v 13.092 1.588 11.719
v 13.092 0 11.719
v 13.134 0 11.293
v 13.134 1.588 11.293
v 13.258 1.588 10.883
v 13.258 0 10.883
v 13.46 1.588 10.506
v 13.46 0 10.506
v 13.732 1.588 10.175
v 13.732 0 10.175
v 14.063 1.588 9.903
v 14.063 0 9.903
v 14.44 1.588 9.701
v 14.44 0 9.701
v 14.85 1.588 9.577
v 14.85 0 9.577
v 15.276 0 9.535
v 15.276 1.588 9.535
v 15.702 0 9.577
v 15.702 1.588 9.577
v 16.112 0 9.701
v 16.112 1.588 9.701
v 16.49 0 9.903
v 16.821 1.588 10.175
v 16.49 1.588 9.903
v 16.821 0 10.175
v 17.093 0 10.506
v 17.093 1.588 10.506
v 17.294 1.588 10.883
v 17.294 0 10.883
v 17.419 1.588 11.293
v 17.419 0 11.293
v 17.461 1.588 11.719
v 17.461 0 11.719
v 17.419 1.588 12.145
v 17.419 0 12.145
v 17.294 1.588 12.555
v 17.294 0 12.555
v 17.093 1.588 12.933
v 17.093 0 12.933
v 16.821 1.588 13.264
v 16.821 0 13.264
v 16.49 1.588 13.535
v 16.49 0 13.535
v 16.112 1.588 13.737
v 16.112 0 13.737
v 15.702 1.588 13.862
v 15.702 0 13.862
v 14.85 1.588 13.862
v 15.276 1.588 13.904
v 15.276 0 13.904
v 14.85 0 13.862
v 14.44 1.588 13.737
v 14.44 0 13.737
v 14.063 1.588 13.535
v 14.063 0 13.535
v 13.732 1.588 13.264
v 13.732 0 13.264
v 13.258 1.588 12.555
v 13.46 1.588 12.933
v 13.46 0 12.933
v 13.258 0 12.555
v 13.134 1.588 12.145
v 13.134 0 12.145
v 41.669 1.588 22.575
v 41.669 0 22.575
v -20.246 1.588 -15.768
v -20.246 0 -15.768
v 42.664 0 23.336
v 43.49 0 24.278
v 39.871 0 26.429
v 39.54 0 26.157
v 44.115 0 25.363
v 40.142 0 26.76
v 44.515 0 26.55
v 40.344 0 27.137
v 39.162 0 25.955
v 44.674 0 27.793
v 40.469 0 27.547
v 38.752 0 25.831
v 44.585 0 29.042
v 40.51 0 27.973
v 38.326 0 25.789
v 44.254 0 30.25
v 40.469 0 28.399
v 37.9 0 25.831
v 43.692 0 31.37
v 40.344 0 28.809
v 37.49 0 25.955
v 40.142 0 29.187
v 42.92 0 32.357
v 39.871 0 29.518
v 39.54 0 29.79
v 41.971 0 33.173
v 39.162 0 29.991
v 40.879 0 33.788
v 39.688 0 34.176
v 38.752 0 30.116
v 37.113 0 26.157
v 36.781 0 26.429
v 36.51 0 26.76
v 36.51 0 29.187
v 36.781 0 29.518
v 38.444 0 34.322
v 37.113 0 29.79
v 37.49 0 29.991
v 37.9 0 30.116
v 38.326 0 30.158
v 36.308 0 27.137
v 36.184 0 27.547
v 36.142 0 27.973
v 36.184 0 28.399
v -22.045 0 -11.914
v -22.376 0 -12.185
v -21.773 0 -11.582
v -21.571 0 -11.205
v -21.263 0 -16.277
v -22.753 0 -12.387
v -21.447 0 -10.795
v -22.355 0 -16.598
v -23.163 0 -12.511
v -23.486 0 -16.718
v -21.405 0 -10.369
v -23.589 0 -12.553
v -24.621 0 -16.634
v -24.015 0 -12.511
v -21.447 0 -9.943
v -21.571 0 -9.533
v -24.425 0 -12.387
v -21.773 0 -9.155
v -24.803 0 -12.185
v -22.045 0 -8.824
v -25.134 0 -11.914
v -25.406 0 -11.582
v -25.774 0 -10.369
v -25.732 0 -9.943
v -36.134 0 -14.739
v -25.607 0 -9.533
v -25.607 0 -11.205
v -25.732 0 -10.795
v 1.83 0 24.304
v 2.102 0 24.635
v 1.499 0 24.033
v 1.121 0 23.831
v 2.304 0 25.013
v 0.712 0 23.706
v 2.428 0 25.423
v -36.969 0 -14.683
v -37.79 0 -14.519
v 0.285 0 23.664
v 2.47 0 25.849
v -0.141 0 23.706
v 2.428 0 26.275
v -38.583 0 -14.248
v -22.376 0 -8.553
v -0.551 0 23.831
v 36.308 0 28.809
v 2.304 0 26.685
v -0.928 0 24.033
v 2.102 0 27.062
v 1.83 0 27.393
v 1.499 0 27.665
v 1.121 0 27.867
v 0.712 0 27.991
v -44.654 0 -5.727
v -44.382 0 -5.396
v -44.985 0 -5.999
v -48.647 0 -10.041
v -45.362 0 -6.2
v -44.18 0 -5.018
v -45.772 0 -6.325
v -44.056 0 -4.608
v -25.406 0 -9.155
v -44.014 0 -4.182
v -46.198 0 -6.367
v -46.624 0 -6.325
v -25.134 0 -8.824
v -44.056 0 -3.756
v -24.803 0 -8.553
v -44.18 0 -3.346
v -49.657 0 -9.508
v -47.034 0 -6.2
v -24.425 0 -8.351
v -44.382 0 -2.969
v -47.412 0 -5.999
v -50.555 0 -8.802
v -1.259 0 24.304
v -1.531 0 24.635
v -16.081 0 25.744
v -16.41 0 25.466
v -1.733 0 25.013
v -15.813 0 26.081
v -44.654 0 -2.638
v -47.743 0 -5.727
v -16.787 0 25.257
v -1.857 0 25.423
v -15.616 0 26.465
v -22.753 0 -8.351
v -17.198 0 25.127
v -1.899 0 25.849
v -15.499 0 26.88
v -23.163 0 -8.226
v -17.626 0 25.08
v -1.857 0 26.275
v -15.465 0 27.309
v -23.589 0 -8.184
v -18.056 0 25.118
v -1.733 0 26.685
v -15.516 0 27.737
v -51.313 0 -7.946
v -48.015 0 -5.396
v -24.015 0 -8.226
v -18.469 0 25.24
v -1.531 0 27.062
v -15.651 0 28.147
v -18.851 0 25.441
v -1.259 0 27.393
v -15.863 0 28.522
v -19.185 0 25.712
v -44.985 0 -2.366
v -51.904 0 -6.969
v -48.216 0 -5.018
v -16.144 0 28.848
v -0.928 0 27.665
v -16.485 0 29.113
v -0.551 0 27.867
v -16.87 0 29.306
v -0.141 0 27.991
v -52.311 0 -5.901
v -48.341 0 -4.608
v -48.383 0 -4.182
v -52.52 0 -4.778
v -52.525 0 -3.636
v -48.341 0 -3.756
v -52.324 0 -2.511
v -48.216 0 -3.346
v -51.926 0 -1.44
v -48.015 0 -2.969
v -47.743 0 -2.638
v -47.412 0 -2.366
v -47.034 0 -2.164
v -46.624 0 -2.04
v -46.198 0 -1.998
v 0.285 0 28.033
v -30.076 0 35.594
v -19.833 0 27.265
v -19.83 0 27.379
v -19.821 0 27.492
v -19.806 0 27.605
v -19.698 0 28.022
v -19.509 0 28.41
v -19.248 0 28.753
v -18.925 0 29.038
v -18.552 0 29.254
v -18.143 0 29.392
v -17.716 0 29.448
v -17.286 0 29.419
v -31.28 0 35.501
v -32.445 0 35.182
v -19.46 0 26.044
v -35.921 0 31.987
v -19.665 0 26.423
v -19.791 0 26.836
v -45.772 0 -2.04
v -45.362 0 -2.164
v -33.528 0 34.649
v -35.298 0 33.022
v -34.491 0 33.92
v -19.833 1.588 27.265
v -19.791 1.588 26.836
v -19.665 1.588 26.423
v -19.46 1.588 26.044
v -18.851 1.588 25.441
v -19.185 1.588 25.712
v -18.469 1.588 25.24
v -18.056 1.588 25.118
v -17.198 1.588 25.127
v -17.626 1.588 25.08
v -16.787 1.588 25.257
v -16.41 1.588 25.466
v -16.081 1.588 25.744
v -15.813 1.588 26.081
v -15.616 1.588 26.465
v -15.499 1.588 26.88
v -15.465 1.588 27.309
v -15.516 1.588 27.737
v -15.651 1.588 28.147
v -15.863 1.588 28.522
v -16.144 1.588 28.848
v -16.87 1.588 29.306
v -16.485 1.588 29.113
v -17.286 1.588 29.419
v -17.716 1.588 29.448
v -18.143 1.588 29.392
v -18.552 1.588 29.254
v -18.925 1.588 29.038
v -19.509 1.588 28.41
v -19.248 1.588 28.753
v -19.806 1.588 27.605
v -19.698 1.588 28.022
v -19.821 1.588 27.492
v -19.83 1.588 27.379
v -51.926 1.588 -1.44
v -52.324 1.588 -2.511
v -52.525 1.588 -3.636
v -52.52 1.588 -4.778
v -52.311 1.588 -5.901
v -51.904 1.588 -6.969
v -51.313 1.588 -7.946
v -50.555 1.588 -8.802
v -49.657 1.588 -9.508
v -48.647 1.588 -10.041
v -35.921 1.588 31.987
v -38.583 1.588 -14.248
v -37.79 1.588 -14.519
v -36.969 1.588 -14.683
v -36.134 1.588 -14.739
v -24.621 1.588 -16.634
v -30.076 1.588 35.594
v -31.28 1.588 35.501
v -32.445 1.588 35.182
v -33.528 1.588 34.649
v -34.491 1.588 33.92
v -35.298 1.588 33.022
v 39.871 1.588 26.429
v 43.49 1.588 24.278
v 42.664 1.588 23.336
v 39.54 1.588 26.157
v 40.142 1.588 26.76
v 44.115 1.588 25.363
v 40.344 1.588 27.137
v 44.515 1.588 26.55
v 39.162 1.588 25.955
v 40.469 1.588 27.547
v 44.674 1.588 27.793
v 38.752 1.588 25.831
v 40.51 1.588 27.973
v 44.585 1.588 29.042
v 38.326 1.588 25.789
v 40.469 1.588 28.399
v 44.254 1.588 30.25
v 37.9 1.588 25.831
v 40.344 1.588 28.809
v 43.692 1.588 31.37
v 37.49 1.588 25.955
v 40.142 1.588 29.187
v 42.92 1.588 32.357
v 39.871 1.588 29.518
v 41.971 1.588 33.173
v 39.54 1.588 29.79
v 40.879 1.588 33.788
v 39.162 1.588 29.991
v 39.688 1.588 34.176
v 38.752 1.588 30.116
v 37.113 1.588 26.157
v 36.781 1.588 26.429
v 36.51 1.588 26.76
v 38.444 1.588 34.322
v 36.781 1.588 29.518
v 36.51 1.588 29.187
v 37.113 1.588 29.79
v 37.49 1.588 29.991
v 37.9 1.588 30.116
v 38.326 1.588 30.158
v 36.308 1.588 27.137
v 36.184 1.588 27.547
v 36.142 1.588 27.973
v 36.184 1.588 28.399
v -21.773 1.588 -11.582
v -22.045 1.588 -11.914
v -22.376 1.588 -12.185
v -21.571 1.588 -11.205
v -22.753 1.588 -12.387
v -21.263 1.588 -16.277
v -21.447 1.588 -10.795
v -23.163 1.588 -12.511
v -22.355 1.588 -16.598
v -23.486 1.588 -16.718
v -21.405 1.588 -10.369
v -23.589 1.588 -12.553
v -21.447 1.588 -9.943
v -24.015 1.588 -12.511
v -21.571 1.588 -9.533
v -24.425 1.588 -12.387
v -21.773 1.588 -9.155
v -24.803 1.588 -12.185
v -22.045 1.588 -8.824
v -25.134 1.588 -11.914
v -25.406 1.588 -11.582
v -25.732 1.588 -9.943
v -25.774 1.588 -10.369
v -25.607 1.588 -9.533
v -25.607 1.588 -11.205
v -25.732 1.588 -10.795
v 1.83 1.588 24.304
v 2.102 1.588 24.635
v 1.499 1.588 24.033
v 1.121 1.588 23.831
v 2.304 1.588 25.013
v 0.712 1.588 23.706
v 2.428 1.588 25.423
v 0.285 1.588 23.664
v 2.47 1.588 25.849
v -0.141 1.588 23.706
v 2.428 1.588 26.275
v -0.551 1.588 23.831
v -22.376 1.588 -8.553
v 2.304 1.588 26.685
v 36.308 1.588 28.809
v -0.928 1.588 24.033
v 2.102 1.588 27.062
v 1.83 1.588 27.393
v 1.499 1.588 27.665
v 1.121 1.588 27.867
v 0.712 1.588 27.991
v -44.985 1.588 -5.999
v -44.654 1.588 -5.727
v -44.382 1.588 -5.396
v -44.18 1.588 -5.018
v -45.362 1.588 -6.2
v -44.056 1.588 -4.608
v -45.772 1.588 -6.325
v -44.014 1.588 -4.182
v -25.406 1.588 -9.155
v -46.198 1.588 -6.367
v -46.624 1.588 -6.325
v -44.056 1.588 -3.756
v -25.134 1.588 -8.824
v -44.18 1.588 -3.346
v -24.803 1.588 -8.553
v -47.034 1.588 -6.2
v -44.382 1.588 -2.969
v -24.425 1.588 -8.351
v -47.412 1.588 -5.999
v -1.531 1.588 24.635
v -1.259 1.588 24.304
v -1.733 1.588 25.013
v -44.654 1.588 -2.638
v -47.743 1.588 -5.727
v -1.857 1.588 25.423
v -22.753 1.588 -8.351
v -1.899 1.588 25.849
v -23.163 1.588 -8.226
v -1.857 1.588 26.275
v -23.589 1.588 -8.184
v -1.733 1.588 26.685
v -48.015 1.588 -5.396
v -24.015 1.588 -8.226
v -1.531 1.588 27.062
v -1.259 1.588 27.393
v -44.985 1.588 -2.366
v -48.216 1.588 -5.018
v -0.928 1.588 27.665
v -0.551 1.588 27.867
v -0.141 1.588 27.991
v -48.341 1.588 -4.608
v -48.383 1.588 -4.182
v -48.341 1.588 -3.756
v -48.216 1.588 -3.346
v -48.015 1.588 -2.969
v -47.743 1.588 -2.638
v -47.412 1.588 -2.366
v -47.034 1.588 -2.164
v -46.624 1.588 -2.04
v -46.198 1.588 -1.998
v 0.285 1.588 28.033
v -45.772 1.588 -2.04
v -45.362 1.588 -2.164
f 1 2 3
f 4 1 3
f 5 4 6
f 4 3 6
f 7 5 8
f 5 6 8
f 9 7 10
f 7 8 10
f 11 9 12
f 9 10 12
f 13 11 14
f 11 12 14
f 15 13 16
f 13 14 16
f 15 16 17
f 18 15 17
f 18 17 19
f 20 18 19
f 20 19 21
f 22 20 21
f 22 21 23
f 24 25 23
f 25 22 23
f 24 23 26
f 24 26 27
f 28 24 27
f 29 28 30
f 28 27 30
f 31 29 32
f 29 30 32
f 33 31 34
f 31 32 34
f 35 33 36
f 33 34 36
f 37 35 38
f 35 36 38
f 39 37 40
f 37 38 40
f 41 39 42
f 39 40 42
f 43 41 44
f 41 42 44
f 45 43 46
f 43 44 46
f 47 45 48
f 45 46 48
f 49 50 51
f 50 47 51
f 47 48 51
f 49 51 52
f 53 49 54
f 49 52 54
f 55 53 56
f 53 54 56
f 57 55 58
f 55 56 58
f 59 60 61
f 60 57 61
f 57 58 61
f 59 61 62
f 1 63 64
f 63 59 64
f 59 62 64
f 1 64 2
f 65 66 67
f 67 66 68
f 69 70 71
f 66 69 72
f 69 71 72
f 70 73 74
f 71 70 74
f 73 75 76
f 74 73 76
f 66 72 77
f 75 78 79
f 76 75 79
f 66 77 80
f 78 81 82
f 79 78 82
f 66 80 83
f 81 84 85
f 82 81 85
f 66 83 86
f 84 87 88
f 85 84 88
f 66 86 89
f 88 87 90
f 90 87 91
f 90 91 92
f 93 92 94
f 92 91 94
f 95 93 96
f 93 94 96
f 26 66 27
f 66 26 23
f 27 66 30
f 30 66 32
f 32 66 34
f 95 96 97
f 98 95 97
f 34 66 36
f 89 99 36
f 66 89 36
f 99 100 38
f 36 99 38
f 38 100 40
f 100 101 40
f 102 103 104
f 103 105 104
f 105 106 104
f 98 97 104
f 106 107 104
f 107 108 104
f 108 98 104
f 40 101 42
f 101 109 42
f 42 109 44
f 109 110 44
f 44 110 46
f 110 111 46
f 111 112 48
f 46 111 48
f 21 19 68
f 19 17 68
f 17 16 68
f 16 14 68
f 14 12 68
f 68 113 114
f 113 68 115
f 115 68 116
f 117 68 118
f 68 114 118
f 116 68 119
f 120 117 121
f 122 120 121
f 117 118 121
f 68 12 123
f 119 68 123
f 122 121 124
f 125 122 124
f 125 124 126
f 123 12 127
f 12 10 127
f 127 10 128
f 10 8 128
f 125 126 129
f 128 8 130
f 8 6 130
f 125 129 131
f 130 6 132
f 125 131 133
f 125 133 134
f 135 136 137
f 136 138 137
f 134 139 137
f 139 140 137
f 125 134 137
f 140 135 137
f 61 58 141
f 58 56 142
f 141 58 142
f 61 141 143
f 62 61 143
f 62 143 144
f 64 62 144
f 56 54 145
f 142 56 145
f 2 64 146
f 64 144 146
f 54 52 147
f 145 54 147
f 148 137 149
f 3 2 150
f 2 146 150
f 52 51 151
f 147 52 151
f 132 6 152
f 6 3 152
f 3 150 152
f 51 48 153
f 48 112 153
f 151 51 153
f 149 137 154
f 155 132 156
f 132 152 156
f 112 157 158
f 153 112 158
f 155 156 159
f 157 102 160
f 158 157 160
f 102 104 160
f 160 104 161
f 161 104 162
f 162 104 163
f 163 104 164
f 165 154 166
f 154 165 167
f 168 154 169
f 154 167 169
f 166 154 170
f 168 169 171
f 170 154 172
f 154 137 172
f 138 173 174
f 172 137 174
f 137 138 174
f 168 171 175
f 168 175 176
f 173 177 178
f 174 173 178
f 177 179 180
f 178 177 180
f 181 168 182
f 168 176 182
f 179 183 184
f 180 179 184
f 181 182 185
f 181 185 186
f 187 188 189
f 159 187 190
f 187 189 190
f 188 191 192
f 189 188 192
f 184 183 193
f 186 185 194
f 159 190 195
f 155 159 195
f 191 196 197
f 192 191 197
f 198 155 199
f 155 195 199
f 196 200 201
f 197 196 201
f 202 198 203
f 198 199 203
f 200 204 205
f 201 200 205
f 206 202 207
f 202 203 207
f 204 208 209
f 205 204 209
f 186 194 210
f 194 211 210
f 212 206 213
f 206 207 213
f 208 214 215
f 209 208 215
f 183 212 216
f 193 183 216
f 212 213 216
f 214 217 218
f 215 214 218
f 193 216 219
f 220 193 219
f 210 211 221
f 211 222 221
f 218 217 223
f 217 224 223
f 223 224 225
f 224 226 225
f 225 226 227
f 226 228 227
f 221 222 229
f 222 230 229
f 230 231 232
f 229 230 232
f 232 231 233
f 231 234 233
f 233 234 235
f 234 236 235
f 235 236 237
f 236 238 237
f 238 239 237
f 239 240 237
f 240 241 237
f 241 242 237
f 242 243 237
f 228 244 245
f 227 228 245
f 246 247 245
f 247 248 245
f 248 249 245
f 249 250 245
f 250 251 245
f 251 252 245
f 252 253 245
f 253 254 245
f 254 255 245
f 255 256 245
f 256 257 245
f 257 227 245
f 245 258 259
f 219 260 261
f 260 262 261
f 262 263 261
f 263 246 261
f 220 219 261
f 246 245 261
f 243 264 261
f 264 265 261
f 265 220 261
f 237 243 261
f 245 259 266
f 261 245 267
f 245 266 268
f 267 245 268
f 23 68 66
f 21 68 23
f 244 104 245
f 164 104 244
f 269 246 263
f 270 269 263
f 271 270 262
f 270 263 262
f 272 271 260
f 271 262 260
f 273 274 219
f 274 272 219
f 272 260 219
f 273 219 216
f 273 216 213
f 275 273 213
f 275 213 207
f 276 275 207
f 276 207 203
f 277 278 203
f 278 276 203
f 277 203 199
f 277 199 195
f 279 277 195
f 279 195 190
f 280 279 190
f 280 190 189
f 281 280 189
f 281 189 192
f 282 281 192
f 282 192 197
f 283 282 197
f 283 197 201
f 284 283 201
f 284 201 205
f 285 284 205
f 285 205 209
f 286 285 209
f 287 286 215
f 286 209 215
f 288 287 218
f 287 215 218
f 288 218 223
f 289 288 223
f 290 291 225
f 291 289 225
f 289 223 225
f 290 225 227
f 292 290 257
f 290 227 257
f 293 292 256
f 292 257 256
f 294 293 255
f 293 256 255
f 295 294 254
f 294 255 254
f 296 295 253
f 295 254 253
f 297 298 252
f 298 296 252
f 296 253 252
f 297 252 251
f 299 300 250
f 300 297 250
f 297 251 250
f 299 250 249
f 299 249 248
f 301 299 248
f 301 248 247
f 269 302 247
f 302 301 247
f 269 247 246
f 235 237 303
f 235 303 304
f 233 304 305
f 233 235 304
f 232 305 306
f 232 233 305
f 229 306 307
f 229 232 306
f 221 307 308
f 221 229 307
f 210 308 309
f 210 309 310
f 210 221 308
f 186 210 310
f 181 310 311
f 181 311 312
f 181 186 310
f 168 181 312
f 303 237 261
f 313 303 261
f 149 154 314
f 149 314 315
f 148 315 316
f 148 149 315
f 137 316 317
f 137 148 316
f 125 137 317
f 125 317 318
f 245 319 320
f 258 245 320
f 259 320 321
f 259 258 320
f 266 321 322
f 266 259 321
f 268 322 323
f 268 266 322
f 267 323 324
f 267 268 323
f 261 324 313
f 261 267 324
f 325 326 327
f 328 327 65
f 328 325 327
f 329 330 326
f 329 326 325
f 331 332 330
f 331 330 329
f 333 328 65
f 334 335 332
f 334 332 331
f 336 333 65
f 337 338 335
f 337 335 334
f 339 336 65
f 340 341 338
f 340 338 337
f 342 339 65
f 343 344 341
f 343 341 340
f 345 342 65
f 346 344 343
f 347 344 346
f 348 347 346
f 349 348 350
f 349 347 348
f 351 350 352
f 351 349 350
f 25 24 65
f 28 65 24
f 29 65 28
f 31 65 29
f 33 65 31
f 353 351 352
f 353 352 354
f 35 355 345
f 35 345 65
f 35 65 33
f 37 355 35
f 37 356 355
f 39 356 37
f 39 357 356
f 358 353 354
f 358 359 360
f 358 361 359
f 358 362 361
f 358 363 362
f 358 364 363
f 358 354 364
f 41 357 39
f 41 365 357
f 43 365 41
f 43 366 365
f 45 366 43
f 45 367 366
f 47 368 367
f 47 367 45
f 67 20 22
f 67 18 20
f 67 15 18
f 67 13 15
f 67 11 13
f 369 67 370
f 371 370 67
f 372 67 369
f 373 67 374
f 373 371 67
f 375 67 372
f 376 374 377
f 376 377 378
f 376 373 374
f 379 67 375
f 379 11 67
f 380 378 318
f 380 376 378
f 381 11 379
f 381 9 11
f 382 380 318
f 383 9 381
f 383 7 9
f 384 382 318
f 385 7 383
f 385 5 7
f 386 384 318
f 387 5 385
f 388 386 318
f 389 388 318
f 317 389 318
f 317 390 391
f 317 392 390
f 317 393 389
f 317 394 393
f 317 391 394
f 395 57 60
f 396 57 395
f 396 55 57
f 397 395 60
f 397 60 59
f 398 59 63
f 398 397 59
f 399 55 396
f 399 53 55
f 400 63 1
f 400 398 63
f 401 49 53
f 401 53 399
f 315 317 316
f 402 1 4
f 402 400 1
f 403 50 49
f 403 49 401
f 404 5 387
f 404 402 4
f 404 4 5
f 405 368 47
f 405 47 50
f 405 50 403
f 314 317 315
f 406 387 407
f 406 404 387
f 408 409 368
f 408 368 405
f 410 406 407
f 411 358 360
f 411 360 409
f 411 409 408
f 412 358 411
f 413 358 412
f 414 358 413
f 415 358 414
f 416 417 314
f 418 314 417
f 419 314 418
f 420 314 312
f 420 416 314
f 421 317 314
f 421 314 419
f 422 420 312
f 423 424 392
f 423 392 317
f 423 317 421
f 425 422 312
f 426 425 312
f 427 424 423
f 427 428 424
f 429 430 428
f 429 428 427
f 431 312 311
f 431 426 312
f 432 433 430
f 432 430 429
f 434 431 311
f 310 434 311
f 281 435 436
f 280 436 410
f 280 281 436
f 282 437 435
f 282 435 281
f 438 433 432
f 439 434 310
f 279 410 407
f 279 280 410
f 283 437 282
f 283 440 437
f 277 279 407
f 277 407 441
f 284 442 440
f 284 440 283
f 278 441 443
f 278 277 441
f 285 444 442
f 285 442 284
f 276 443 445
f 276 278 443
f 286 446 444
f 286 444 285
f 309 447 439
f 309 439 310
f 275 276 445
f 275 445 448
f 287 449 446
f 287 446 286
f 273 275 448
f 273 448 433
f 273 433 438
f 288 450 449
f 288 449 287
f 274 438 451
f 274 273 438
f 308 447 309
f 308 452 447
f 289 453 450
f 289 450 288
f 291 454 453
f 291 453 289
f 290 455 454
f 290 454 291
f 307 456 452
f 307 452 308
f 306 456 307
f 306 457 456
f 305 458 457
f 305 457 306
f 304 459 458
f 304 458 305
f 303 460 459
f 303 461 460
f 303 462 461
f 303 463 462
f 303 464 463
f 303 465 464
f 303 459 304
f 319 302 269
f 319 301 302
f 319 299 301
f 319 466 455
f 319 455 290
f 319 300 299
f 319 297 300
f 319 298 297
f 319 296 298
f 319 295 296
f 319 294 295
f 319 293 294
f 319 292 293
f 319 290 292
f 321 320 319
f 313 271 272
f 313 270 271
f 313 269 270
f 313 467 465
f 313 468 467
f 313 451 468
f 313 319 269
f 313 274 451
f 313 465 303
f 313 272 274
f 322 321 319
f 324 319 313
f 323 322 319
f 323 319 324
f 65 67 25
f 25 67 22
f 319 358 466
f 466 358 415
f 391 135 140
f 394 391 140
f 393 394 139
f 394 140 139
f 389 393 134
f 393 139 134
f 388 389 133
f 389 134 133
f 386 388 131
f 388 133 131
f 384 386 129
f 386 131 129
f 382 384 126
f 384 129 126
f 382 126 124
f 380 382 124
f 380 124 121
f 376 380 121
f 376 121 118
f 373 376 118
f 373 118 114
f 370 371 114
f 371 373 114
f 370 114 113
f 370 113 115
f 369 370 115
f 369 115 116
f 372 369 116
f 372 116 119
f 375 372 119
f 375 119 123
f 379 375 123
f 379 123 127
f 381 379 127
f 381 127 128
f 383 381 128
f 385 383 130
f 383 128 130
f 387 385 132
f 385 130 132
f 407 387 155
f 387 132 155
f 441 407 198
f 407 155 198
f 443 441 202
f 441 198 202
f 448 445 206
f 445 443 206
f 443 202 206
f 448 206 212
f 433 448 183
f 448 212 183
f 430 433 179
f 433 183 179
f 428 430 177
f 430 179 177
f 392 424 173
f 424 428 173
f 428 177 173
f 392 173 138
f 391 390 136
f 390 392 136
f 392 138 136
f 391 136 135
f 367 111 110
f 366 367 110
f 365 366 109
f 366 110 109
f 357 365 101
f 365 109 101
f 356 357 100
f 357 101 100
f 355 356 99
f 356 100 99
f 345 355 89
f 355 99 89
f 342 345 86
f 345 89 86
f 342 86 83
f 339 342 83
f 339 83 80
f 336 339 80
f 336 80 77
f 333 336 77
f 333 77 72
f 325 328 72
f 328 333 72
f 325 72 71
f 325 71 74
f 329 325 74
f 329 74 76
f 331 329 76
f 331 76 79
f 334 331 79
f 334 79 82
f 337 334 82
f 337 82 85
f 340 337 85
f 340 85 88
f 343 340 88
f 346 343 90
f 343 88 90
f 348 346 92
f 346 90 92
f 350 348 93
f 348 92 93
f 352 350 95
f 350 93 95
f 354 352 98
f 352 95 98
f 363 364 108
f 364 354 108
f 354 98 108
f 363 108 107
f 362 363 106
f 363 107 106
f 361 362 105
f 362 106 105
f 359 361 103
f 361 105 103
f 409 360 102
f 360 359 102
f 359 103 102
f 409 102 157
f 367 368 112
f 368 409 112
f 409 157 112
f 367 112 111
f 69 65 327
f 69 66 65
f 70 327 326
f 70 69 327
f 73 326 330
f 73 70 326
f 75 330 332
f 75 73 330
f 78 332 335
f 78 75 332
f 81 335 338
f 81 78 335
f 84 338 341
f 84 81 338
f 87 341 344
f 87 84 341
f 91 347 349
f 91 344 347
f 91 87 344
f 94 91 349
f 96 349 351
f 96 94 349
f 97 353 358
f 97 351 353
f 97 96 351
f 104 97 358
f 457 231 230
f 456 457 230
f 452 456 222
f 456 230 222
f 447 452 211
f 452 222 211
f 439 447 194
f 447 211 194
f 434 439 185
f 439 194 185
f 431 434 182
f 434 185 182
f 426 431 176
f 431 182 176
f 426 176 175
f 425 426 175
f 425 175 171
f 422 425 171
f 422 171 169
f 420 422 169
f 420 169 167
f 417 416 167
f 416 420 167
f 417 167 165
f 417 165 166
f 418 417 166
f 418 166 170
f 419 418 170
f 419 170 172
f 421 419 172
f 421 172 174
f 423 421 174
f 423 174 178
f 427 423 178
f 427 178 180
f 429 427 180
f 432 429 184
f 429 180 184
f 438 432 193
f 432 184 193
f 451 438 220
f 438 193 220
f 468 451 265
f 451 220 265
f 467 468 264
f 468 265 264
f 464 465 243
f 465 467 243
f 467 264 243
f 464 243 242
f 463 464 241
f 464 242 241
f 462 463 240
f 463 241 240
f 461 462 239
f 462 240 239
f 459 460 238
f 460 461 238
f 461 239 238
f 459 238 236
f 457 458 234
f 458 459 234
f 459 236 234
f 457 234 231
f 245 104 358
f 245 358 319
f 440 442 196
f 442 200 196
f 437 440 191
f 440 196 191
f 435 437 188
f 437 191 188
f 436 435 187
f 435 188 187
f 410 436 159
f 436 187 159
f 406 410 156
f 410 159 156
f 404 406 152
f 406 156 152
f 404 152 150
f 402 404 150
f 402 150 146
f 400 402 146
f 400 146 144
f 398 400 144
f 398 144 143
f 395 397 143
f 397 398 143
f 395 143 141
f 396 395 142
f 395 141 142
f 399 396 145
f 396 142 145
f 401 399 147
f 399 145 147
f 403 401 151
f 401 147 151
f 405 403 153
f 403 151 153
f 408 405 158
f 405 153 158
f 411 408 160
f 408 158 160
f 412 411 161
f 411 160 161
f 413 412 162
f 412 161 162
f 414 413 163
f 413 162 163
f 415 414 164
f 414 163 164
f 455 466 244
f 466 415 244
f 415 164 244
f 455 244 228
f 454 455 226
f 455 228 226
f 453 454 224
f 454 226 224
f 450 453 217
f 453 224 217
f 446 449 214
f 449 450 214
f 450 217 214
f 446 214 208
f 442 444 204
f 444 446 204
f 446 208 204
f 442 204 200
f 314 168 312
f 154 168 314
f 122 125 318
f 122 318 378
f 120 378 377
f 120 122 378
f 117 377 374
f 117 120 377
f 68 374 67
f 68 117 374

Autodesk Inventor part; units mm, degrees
ref_plane "YZ Plane" through (0, 0, 0) normal (1, 0, 0) x (0, 1, 0)
ref_plane "XZ Plane" through (0, 0, 0) normal (0, 1, 0) x (-1, 0, 0)
ref_plane "XY Plane" through (0, 0, 0) normal (0, 0, 1) x (1, 0, 0)
sketch "Sketch1" plane through (0, 0, 0) normal (0, 1, 0) x (-1, 0, 0)
  circle A0 centre (-15.2763, 11.7192) radius 2.1844
  circle A1 centre (46.1983, -4.1823) radius 2.1844
  circle A2 centre (-0.2854, 25.8488) radius 2.1844
  circle A3 centre (17.6488, 27.2646) radius 2.1844
  circle A4 centre (23.5893, -10.3689) radius 2.1844
  circle A5 centre (-38.3261, 27.9733) radius 2.1844
  circle A6 centre (-38.3261, 27.9733) radius 6.35
  circle A7 centre (23.5893, -10.3689) radius 6.35
  line L0 (-41.6694, 22.5746) -> (20.246, -15.7676)
  circle A8 centre (46.1983, -4.1823) radius 6.35
  line L1 (17.6488, 27.2646) -> (30.1935, 29.2448)
  circle A9 centre (36.1339, -8.3887) radius 6.35
  line L2 (48.647, -10.0412) -> (38.5826, -14.2476)
  line L3 (36.1339, -14.7387) -> (24.621, -16.6345)
  circle A10 centre (30.1935, 29.2448) radius 6.35
  line L4 (51.9256, -1.4401) -> (35.9208, 31.987)
  line L5 (-38.444, 34.3222) -> (30.0757, 35.5937)
  point P0 (0, 0)
  point P1 (17.7292, 33.6141)
  point P2 (-38.2458, 34.3228)
  point P3 (21.7554, 32.108)
  point P4 (24.1332, -16.6956)
  point P5 (50.8998, 0.086)
  point P6 (22.3503, 31.5329)
  point P7 (47.8742, -10.3072)
  point P8 (25.2652, -16.4937)
  dimension "d0" = 12.7
  dimension "d1" = 12.7
  dimension "d10" = 12.7
  dimension "d11" = 12.7
  dimension "d12" = 12.7
  dimension "d13" = 12.7
extrude "Extrusion1" add sketch "Sketch1" along normal blind 1.5875
properties part number "newsidepolytest2"
